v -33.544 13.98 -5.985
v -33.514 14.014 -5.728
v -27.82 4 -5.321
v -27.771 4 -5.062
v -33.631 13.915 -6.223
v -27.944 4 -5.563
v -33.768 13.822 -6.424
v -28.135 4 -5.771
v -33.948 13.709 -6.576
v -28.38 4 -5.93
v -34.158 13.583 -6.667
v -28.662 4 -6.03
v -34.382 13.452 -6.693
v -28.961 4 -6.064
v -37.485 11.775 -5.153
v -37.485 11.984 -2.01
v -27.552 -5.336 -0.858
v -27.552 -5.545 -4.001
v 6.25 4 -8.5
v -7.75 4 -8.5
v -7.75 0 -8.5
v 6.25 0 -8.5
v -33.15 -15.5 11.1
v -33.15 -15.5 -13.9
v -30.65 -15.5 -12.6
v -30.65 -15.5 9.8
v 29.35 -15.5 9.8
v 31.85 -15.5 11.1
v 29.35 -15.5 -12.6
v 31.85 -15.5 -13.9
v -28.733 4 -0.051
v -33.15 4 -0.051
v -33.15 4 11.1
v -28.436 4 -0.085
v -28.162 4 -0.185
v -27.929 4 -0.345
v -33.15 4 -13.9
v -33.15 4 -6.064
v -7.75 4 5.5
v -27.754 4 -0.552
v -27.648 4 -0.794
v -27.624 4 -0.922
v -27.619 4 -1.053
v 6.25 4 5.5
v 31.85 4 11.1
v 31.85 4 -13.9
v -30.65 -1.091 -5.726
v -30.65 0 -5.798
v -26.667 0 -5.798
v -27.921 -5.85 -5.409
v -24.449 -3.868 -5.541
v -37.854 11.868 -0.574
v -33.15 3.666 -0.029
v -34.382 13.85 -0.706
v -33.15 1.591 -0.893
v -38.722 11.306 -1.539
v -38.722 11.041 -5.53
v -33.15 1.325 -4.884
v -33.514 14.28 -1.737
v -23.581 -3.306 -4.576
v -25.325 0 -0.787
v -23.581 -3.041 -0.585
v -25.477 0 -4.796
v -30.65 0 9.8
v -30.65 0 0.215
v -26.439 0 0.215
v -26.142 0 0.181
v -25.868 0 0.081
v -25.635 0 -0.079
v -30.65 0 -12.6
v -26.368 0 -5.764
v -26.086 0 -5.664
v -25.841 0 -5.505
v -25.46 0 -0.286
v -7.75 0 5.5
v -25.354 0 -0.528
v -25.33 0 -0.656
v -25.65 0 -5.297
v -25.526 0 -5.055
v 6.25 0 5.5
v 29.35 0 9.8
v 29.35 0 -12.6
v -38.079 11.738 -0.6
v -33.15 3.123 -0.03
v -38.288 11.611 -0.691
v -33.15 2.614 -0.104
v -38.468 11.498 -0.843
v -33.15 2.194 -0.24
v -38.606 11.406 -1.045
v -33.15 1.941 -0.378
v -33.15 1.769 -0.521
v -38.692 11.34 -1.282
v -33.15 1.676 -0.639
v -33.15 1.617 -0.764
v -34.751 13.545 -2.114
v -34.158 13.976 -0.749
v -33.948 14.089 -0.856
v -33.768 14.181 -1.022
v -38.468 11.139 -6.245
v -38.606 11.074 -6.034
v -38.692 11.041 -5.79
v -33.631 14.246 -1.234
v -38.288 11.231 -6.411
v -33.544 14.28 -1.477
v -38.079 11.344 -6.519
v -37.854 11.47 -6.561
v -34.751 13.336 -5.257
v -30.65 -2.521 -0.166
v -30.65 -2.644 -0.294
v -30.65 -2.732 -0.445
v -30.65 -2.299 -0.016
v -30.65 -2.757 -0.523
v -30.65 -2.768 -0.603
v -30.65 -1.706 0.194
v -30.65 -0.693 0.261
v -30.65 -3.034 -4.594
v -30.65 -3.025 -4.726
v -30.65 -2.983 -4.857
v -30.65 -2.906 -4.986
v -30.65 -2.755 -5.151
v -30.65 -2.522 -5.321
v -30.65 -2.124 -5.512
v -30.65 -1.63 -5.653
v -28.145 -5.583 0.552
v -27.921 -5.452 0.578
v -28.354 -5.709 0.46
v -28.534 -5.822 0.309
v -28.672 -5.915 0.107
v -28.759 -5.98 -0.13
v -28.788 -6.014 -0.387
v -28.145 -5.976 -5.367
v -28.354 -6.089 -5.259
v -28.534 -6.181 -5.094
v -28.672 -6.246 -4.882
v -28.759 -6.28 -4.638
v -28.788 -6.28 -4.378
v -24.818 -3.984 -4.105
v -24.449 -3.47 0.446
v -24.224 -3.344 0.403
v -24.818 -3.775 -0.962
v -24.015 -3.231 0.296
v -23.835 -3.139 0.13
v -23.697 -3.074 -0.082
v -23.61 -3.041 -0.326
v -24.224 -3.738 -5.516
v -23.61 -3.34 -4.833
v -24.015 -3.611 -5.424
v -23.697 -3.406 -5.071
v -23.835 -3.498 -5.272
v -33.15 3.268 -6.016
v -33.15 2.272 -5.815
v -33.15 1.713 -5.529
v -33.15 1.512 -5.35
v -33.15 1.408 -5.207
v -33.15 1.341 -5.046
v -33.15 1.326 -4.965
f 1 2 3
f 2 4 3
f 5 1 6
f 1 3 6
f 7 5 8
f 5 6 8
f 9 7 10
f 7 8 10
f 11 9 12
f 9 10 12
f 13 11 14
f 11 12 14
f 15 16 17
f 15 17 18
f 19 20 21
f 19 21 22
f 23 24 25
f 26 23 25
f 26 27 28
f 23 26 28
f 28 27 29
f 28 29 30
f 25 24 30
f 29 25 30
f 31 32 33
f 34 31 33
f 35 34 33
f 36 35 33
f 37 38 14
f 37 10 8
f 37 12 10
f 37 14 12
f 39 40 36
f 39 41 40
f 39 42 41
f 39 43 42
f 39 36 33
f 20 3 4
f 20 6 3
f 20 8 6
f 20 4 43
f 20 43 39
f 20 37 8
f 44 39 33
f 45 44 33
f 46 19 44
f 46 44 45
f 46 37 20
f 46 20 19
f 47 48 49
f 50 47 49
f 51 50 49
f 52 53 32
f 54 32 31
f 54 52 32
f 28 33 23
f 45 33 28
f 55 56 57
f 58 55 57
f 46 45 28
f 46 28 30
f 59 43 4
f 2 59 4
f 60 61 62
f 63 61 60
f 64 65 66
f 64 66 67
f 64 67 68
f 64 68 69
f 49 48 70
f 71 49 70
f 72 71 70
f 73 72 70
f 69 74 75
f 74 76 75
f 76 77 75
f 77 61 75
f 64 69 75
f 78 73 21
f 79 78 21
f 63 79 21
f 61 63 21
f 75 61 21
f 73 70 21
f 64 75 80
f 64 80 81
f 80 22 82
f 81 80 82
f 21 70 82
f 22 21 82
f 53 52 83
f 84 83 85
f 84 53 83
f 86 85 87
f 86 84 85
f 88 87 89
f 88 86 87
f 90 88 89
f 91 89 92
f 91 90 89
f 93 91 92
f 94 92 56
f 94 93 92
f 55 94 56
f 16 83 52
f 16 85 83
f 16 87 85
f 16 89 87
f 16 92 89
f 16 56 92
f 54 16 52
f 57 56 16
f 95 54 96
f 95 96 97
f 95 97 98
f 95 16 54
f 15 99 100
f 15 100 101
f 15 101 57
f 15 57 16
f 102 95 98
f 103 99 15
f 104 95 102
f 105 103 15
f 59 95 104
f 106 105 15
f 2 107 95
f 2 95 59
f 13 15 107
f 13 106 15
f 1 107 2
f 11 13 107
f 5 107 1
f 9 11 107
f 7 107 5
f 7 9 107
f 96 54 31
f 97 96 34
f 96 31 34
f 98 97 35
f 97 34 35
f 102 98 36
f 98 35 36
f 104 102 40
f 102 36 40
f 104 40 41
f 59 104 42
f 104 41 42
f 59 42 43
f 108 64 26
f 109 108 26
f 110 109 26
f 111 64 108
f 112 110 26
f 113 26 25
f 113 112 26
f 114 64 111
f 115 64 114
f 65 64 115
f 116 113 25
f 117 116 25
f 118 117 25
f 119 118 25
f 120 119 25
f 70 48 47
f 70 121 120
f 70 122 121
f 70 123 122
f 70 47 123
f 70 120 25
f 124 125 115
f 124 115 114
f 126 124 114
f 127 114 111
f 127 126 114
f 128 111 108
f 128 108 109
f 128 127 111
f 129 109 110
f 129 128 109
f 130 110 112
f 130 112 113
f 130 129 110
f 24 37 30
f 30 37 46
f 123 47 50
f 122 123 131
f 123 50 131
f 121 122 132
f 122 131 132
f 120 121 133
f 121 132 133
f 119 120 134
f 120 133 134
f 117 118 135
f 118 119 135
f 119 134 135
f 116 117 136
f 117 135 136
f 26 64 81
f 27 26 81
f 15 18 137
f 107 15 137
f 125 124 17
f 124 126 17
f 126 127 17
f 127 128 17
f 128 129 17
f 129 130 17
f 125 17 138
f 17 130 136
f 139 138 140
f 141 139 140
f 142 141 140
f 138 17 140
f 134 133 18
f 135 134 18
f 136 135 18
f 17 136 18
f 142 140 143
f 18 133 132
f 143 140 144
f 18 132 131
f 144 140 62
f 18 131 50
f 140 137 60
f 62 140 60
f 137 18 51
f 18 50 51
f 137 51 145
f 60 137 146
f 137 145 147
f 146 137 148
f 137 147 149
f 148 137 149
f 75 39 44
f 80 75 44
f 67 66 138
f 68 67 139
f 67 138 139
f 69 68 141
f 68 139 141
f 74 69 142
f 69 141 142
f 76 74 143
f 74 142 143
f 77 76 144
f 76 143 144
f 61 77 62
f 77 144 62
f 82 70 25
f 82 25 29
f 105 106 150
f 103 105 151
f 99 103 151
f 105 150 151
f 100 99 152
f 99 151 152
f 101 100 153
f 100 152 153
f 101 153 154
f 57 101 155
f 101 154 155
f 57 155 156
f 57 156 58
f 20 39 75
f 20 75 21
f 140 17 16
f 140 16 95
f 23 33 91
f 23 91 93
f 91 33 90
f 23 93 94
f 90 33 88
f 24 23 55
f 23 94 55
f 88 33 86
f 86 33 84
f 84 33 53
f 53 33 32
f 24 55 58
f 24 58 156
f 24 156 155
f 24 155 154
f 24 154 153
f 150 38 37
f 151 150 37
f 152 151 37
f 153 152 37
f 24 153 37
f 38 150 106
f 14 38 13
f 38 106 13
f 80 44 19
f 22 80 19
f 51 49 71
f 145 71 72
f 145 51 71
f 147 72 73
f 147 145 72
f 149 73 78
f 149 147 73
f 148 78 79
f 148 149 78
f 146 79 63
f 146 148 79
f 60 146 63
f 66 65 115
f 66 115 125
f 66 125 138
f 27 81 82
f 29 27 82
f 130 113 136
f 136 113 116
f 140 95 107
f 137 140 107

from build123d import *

# Parameters (mm, degrees)
CROQUIS1_W              = 19
CROQUIS1_H              = 19
SALIENTE_EXTRUIR1_DEPTH = 4
CROQUIS2_W              = 14
CROQUIS2_H              = 14
CORTAR_EXTRUIR1_DEPTH   = 4
SALIENTE_EXTRUIR2_DEPTH = 4
CROQUIS9_W              = 6
CROQUIS9_H              = 6
SALIENTE_EXTRUIR6_DEPTH = 20
CROQUIS11_W             = 3.15
CROQUIS11_H             = 3.15
CORTAR_EXTRUIR3_DEPTH   = 20
REDONDEO1_R             = 3
REDONDEO2_R             = 3
REDONDEO3_R             = 3
REDONDEO6_R             = 1
REDONDEO7_R             = 1
SALIENTE_EXTRUIR7_START = -4
CROQUIS12_W             = 65
CROQUIS12_H             = 25
CROQUIS12_W_2           = 14
CROQUIS12_H_2           = 14
SALIENTE_EXTRUIR7_DEPTH = 4
CROQUIS13_W             = 65
CROQUIS13_H             = 25
CROQUIS13_W_2           = 60
CROQUIS13_H_2           = 22.4
SALIENTE_EXTRUIR8_DEPTH = 19.5
CROQUIS15_W             = 3.15
CROQUIS15_H             = 3.15
CORTAR_EXTRUIR4_DEPTH   = 20


with BuildPart() as part:
    # Croquis1 → Saliente-Extruir1 (new body)
    with BuildSketch(Plane(origin=(0, 0, 0), x_dir=(1, 0, 0), z_dir=(0, 1, 0))):
        Rectangle(CROQUIS1_W, CROQUIS1_H)
    extrude(amount=SALIENTE_EXTRUIR1_DEPTH)

    # Croquis2 → Cortar-Extruir1 (cut)
    with BuildSketch(Plane(origin=(0, 4, 0), x_dir=(1, 0, 0), z_dir=(0, 1, 0))):
        with Locations((-0.75, 1.5)):
            Rectangle(CROQUIS2_W, CROQUIS2_H)
    extrude(amount=-CORTAR_EXTRUIR1_DEPTH, mode=Mode.SUBTRACT)

    # Croquis3 → Saliente-Extruir2 (add)
    with BuildSketch(Plane(origin=(0, 4, 0), x_dir=(1, 0, 0), z_dir=(0, 1, 0))):
        Polygon((-9.5, 9.5), (-31.5, 5.730831712), (-31.5, 0.051028536), (-9.5, -2.5), align=None)
    extrude(amount=-SALIENTE_EXTRUIR2_DEPTH)

    # Croquis9 → Saliente-Extruir6 (add)
    with BuildSketch(Plane(origin=(-14.459222514, 25.211914346, -1.676631329), x_dir=(0.8679382707913074, 0.4955774572451805, -0.03295666800810758), z_dir=(-0.49667208306466687, 0.8660254037844359, -0.05759202986706984))):
        with Locations((-24.954381149, 2.785496138)):
            Rectangle(CROQUIS9_W, CROQUIS9_H)
    extrude(amount=-SALIENTE_EXTRUIR6_DEPTH)

    # Croquis11 → Cortar-Extruir3 (cut)
    with BuildSketch(Plane(origin=(-14.459222514, 25.211914346, -1.676631329), x_dir=(0.8679382707913073, 0.4955774572451806, -0.032956668008107474), z_dir=(-0.4966720830646669, 0.8660254037844358, -0.05759202986706968))):
        with Locations((-24.954381149, 2.785496138)):
            Rectangle(CROQUIS11_W, CROQUIS11_H)
    extrude(amount=-CORTAR_EXTRUIR3_DEPTH, mode=Mode.SUBTRACT)

    # Redondeo1
    redondeo1_edges = [part.edges().sort_by_distance(p)[0] for p in [
        (9.5, 2, -9.5),
        (9.5, 2, 9.5),
        (-9.5, 2, 9.5),
    ]]
    fillet(redondeo1_edges, radius=REDONDEO1_R)

    # Redondeo2
    redondeo2_edges = [part.edges().sort_by_distance(p)[0] for p in [
        (-9.5, 2, -9.5),
    ]]
    fillet(redondeo2_edges, radius=REDONDEO2_R)

    # Redondeo3
    redondeo3_edges = [part.edges().sort_by_distance(p)[0] for p in [
        (-9.5, 2, 2.5),
    ]]
    fillet(redondeo3_edges, radius=REDONDEO3_R)

    # Redondeo6
    redondeo6_edges = [part.edges().sort_by_distance(p)[0] for p in [
        (-24.54793036, -1.686293309, -5.686133961),
        (-30.661666234, 8.973960729, -6.395057355),
        (-30.547500987, 9.17302568, -0.395042751),
        (-24.433765113, -1.487228357, 0.313880643),
        (-33.755178919, 2.71233258, 0.03460334),
    ]]
    fillet(redondeo6_edges, radius=REDONDEO6_R)

    # Redondeo7
    redondeo7_edges = [part.edges().sort_by_distance(p)[0] for p in [
        (-33.755178919, 2.314202677, -5.952173136),
    ]]
    fillet(redondeo7_edges, radius=REDONDEO7_R)

    # Croquis12 → Saliente-Extruir7 (add)
    with BuildSketch(Plane(origin=(0, 4, 0), x_dir=(1, 0, 0), z_dir=(0, 1, 0)).offset(SALIENTE_EXTRUIR7_START)):
        with Locations((-0.65, 1.4)):
            Rectangle(CROQUIS12_W, CROQUIS12_H)
        with Locations((-0.75, 1.5)):
            Rectangle(CROQUIS12_W_2, CROQUIS12_H_2, mode=Mode.SUBTRACT)
    extrude(amount=SALIENTE_EXTRUIR7_DEPTH)

    # Croquis13 → Saliente-Extruir8 (add)
    with BuildSketch(Plane(origin=(0, 4, 0), x_dir=(1, 0, 0), z_dir=(0, 1, 0))):
        with Locations((-0.65, 1.4)):
            Rectangle(CROQUIS13_W, CROQUIS13_H)
        with Locations((-0.65, 1.4)):
            Rectangle(CROQUIS13_W_2, CROQUIS13_H_2, mode=Mode.SUBTRACT)
    extrude(amount=-SALIENTE_EXTRUIR8_DEPTH)

    # Croquis15 → Cortar-Extruir4 (cut)
    with BuildSketch(Plane(origin=(-14.459222514, 25.211914346, -1.676631329), x_dir=(0.8679382707913073, 0.4955774572451806, -0.032956668008107474), z_dir=(-0.4966720830646669, 0.8660254037844358, -0.05759202986706968))):
        with Locations((-24.954381149, 2.785496138)):
            Rectangle(CROQUIS15_W, CROQUIS15_H)
    extrude(amount=-CORTAR_EXTRUIR4_DEPTH, mode=Mode.SUBTRACT)


solid = part.part
